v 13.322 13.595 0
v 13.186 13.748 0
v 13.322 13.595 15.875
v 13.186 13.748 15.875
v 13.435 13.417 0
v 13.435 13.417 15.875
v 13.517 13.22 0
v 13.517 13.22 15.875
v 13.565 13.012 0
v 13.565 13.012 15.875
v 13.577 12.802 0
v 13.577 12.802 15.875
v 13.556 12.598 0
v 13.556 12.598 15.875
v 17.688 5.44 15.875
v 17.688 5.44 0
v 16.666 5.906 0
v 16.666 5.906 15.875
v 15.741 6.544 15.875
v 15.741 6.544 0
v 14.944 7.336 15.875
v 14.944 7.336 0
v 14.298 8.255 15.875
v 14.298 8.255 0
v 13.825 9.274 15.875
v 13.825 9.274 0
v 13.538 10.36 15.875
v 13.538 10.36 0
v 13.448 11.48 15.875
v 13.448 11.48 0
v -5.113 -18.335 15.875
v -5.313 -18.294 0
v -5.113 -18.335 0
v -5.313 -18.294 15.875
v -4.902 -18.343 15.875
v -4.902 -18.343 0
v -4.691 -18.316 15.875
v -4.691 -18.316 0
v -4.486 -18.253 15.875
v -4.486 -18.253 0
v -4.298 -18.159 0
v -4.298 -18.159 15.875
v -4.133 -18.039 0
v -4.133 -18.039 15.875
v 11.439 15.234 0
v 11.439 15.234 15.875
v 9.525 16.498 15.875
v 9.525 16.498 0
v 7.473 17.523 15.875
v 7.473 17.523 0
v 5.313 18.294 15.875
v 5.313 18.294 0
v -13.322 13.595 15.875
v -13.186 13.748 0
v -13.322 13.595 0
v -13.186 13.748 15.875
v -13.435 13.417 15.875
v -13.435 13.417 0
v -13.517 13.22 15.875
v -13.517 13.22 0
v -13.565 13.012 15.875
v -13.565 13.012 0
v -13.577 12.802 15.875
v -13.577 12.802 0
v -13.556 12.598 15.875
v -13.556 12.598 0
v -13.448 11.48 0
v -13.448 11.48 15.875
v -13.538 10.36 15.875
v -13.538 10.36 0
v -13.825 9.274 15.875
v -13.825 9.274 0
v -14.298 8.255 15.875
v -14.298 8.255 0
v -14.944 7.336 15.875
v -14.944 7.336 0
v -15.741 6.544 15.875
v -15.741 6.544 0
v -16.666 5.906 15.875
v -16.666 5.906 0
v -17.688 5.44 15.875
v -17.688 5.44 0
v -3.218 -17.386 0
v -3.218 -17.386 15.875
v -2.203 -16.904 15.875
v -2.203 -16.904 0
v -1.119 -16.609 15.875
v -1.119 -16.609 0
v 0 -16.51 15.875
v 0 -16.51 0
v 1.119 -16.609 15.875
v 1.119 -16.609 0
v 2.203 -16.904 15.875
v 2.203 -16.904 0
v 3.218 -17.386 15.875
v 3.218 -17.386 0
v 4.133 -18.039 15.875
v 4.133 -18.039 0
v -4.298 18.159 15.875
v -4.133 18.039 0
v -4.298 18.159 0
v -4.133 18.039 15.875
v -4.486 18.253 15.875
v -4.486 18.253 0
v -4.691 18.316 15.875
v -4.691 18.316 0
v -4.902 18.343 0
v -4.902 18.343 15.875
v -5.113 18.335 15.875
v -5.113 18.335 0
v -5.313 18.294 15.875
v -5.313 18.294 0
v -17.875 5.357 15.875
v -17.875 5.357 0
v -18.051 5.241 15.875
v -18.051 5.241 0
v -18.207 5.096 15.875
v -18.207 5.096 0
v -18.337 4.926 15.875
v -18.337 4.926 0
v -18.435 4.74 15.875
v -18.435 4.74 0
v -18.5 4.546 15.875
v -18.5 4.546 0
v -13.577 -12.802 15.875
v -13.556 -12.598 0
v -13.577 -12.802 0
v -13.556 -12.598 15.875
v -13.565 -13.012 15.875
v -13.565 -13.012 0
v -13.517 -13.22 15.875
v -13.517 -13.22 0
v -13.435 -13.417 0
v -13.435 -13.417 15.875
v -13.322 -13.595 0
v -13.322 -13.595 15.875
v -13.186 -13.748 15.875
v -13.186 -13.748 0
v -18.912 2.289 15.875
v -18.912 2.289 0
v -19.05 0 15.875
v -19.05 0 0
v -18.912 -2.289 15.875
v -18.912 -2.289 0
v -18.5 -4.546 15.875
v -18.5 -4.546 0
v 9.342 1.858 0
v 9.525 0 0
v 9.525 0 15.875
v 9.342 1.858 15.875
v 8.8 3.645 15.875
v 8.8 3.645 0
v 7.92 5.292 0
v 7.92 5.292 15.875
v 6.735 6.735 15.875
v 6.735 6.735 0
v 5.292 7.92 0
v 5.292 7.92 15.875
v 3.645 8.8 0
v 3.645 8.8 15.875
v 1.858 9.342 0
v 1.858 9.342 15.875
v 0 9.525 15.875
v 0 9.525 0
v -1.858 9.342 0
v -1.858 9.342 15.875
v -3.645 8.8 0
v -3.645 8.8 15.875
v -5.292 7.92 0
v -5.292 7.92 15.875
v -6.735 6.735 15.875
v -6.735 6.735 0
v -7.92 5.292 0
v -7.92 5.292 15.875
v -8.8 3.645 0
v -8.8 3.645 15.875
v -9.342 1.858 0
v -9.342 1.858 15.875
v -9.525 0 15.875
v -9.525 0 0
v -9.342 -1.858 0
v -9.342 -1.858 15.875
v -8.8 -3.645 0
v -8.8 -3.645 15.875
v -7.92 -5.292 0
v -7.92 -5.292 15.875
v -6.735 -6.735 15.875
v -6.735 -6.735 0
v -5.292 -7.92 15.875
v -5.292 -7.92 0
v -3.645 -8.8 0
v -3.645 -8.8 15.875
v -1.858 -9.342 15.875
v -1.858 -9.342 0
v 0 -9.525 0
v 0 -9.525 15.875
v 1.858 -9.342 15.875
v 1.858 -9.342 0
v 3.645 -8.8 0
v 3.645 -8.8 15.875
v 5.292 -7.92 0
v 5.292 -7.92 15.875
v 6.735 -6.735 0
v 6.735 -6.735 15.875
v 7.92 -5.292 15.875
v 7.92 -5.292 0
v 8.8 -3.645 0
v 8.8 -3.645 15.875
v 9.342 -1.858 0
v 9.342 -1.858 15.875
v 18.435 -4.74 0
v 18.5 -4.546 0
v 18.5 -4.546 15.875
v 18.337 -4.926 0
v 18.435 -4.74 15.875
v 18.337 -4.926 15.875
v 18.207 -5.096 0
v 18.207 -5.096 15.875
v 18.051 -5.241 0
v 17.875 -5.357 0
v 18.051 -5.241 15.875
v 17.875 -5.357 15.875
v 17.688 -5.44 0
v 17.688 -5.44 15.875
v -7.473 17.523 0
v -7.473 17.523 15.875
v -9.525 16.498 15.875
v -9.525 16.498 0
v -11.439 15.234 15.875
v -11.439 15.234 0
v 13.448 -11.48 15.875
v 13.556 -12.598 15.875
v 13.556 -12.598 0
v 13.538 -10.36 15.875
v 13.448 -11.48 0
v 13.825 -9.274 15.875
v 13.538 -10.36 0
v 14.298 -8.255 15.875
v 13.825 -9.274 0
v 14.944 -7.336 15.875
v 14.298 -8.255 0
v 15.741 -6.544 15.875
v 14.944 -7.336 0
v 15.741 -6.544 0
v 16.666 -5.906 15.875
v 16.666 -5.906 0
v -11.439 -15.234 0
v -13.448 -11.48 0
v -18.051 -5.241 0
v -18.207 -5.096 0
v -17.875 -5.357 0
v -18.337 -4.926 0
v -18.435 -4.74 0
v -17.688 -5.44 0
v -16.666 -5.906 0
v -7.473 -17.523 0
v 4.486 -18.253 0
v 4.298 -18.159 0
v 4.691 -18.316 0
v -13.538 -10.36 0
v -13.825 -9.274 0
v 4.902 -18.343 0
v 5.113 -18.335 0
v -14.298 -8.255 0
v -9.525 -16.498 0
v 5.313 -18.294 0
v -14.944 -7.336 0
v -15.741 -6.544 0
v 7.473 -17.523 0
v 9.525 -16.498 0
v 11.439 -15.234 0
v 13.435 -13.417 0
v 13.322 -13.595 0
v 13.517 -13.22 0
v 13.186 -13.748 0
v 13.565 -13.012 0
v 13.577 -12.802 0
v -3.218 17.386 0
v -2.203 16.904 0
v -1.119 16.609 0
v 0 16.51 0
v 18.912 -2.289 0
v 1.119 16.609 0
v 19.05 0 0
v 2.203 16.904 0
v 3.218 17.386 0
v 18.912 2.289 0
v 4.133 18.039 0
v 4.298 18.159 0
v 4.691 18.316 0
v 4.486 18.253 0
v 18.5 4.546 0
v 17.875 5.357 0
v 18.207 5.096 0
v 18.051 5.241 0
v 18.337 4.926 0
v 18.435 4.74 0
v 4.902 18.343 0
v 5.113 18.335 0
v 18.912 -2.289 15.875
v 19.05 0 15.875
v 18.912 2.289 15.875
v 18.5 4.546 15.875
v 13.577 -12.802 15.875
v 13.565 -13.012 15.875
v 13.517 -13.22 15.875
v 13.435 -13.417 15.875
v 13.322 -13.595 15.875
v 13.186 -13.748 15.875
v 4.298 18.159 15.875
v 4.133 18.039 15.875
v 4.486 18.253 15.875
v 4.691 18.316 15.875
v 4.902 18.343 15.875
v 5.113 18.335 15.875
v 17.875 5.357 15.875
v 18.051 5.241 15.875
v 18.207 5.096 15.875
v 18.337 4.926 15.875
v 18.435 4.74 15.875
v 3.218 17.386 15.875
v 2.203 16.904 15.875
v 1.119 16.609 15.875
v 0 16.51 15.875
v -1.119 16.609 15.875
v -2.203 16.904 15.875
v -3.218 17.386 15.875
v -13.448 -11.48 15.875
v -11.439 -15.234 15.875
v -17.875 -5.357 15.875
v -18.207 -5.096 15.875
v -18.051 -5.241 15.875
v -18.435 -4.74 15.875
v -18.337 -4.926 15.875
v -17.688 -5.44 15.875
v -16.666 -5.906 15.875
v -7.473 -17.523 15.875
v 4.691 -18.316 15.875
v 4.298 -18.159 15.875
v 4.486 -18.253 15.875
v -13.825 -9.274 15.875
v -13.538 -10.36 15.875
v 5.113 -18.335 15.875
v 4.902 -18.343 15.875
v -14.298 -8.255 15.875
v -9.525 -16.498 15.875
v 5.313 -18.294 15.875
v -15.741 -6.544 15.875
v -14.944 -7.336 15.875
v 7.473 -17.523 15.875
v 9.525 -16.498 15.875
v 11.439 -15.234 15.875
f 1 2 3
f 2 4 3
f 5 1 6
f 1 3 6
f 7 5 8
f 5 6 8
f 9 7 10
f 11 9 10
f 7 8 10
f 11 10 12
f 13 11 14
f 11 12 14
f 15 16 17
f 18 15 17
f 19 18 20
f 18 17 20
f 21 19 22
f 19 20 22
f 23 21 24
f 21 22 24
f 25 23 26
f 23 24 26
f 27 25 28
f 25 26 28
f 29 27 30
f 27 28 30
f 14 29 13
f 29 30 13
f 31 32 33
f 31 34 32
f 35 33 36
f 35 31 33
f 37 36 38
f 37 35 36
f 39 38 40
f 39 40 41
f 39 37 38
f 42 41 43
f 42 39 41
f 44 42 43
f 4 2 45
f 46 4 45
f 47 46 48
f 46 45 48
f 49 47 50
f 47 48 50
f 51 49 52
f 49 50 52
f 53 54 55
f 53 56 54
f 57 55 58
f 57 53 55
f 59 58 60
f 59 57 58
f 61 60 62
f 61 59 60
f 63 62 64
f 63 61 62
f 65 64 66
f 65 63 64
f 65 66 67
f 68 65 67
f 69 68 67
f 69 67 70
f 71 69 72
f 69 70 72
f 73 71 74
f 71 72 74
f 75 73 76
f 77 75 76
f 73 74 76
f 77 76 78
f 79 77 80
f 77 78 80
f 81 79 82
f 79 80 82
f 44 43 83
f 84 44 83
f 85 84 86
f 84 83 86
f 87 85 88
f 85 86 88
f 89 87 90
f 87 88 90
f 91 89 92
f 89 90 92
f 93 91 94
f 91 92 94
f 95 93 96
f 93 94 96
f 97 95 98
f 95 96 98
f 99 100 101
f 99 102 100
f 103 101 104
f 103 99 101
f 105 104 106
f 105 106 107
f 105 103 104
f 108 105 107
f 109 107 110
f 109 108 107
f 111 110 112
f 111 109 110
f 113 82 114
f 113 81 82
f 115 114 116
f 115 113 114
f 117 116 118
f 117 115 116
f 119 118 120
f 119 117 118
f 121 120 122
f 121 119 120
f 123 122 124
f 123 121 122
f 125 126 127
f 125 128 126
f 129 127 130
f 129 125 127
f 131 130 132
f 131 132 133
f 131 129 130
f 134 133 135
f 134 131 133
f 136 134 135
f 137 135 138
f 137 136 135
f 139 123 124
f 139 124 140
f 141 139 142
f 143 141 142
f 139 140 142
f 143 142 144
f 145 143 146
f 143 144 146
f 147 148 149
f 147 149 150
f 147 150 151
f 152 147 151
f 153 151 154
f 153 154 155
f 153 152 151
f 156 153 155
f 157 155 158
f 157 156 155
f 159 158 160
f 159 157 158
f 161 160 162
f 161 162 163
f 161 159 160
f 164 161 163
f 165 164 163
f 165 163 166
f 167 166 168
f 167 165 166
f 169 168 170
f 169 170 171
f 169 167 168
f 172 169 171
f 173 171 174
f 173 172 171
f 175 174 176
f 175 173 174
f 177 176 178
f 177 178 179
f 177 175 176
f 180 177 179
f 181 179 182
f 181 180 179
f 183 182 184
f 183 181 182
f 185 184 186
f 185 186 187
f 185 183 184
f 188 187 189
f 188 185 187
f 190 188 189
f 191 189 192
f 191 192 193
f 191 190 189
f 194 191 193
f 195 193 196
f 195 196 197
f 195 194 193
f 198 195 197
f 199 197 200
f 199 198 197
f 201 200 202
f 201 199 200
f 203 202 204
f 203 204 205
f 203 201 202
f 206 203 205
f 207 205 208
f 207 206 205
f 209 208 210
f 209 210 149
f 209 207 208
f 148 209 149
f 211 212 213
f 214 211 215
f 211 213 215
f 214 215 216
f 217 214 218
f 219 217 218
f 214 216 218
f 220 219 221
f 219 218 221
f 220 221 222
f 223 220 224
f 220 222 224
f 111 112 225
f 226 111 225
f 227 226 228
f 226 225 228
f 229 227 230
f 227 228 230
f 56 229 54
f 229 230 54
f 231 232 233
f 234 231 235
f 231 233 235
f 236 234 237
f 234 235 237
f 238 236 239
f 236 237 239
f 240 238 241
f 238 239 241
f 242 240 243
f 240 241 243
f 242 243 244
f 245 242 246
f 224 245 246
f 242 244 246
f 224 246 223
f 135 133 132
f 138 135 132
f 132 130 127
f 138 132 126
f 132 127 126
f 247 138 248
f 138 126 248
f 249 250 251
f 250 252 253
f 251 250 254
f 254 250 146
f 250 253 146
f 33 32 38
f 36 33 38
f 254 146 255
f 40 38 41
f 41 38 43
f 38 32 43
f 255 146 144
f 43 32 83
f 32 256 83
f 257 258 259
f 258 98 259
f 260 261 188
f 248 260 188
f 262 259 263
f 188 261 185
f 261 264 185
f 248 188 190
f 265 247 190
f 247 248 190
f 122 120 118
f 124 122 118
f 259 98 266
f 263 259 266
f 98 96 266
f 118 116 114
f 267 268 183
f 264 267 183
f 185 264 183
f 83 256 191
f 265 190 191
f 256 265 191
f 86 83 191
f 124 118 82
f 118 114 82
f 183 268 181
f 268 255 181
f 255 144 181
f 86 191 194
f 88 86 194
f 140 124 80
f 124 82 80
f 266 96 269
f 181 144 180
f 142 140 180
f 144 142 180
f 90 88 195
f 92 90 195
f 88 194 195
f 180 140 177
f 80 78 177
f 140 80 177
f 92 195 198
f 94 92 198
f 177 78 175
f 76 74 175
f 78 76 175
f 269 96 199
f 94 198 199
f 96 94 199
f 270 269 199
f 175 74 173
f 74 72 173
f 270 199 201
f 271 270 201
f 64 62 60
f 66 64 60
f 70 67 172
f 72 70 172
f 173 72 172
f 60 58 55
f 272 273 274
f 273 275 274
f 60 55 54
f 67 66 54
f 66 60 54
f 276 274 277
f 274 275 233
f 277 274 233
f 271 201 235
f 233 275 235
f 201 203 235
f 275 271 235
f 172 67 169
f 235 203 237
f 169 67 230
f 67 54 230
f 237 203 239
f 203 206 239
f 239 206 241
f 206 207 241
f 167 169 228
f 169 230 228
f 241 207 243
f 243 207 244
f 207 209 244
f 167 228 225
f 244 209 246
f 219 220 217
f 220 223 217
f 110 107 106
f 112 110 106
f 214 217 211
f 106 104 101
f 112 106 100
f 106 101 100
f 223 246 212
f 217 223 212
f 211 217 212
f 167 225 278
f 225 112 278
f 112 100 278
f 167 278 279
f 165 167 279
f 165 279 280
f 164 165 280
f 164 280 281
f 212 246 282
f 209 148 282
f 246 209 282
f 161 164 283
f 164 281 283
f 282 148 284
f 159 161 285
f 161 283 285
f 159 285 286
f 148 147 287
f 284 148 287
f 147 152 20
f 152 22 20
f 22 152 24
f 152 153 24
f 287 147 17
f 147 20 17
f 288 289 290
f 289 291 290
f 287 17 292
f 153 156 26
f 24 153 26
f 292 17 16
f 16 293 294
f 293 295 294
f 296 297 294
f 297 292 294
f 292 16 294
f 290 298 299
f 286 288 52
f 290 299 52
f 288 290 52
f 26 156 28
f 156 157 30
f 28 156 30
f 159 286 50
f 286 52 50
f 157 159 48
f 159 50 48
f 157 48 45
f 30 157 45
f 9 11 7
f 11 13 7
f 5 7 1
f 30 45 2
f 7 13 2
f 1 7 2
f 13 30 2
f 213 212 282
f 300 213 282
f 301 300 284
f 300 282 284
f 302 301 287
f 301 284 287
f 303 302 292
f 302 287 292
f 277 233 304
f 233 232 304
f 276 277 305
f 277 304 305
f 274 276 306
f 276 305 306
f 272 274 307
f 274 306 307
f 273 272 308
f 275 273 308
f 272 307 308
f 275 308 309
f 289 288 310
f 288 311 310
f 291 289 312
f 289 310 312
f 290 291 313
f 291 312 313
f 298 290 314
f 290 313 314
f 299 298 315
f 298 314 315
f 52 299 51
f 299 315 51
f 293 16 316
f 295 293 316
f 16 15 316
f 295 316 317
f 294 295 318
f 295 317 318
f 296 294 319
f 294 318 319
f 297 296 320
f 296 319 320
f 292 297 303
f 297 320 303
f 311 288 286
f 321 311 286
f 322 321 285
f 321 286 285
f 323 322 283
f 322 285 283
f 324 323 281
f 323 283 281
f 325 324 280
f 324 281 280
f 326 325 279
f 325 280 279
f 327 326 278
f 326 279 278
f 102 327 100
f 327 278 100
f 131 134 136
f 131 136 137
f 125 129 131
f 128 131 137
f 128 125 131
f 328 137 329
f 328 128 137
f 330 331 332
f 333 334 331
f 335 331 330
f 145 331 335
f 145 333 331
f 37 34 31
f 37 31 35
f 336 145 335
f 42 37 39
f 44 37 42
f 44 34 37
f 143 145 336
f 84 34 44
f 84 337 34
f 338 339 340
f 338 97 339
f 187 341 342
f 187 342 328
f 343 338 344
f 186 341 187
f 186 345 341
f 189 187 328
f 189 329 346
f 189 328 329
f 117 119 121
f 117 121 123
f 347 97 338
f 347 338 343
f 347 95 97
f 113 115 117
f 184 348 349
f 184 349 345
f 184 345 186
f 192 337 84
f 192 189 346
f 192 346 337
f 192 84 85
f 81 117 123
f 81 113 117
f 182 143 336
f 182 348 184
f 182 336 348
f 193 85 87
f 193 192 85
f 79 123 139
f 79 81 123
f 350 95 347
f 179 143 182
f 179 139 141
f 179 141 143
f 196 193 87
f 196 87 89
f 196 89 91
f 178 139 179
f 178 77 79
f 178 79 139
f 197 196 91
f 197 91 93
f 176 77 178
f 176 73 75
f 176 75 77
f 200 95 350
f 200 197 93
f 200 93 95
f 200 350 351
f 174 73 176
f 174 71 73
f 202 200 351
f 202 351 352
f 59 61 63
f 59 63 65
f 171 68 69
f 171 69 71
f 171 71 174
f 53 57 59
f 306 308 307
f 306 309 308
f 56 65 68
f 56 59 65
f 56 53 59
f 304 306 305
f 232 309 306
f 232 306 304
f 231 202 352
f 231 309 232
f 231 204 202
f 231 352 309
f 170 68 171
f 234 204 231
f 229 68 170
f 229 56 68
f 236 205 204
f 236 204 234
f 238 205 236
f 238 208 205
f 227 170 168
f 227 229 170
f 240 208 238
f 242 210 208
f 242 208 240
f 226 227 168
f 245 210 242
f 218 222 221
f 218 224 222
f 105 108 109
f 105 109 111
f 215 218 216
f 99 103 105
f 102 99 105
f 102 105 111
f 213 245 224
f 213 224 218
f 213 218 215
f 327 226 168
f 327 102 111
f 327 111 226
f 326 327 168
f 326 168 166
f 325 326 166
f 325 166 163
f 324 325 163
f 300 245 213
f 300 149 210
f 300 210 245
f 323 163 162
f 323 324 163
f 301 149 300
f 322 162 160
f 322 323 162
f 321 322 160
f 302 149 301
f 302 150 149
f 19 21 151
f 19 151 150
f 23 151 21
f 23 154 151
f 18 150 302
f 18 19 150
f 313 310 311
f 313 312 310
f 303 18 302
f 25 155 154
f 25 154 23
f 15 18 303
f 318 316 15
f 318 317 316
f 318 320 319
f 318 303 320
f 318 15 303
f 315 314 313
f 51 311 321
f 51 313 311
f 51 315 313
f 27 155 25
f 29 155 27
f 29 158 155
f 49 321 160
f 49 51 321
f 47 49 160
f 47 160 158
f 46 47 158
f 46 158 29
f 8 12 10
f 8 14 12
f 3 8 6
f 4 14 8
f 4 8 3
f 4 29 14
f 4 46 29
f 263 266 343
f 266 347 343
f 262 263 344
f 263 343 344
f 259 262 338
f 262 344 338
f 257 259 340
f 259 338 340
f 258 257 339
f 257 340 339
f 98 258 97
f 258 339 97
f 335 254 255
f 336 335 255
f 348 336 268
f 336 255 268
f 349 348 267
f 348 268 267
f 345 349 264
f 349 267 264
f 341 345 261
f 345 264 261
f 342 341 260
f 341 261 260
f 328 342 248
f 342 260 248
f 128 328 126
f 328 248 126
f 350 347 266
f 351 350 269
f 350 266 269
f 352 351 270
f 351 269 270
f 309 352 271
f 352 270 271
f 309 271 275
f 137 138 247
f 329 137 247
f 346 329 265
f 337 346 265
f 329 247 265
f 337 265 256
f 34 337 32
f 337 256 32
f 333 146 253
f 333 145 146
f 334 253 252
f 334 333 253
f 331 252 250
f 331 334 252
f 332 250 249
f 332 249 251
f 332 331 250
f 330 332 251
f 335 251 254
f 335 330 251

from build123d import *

# Parameters (mm, degrees)
F0_R     = 9.525
F1_DEPTH = 15.875
F2_R     = 1.27


with BuildPart() as f1:
    # F0 (on Top) → F1 (new body)
    with BuildSketch(Plane.XY):
        with BuildLine():
            ThreePointArc((4.602905, 18.485556), (0, 16.51), (-4.602905, 18.485556))
            ThreePointArc((-4.602905, 18.485556), (-9.525, 16.497784), (-13.707508, 13.229011))
            ThreePointArc((-13.707508, 13.229011), (-14.298079, 8.255), (-18.310413, 5.256545))
            ThreePointArc((-18.310413, 5.256545), (-19.05, 0), (-18.310413, -5.256545))
            ThreePointArc((-18.310413, -5.256545), (-14.298079, -8.255), (-13.707508, -13.229011))
            ThreePointArc((-13.707508, -13.229011), (-9.525, -16.497784), (-4.602905, -18.485556))
            ThreePointArc((-4.602905, -18.485556), (0, -16.51), (4.602905, -18.485556))
            ThreePointArc((4.602905, -18.485556), (9.525, -16.497784), (13.707508, -13.229011))
            ThreePointArc((13.707508, -13.229011), (14.298079, -8.255), (18.310413, -5.256545))
            ThreePointArc((18.310413, -5.256545), (19.05, 0), (18.310413, 5.256545))
            ThreePointArc((18.310413, 5.256545), (14.298079, 8.255), (13.707508, 13.229011))
            ThreePointArc((13.707508, 13.229011), (9.525, 16.497784), (4.602905, 18.485556))
        make_face()
        Circle(F0_R, mode=Mode.SUBTRACT)
    extrude(amount=F1_DEPTH)

    # F2
    f2_edges = [f1.edges().sort_by_distance(p)[0] for p in [
        (13.707508, -13.229011, 7.9375),
        (4.602905, -18.485556, 7.9375),
        (18.310413, -5.256545, 7.9375),
        (18.310413, 5.256545, 7.9375),
        (13.707508, 13.229011, 7.9375),
        (4.602905, 18.485556, 7.9375),
        (-4.602905, 18.485556, 7.9375),
        (-13.707508, 13.229011, 7.9375),
        (-18.310413, 5.256545, 7.9375),
        (-18.310413, -5.256545, 7.9375),
        (-13.707508, -13.229011, 7.9375),
        (-4.602905, -18.485556, 7.9375),
    ]]
    fillet(f2_edges, radius=F2_R)


solid = f1.part
